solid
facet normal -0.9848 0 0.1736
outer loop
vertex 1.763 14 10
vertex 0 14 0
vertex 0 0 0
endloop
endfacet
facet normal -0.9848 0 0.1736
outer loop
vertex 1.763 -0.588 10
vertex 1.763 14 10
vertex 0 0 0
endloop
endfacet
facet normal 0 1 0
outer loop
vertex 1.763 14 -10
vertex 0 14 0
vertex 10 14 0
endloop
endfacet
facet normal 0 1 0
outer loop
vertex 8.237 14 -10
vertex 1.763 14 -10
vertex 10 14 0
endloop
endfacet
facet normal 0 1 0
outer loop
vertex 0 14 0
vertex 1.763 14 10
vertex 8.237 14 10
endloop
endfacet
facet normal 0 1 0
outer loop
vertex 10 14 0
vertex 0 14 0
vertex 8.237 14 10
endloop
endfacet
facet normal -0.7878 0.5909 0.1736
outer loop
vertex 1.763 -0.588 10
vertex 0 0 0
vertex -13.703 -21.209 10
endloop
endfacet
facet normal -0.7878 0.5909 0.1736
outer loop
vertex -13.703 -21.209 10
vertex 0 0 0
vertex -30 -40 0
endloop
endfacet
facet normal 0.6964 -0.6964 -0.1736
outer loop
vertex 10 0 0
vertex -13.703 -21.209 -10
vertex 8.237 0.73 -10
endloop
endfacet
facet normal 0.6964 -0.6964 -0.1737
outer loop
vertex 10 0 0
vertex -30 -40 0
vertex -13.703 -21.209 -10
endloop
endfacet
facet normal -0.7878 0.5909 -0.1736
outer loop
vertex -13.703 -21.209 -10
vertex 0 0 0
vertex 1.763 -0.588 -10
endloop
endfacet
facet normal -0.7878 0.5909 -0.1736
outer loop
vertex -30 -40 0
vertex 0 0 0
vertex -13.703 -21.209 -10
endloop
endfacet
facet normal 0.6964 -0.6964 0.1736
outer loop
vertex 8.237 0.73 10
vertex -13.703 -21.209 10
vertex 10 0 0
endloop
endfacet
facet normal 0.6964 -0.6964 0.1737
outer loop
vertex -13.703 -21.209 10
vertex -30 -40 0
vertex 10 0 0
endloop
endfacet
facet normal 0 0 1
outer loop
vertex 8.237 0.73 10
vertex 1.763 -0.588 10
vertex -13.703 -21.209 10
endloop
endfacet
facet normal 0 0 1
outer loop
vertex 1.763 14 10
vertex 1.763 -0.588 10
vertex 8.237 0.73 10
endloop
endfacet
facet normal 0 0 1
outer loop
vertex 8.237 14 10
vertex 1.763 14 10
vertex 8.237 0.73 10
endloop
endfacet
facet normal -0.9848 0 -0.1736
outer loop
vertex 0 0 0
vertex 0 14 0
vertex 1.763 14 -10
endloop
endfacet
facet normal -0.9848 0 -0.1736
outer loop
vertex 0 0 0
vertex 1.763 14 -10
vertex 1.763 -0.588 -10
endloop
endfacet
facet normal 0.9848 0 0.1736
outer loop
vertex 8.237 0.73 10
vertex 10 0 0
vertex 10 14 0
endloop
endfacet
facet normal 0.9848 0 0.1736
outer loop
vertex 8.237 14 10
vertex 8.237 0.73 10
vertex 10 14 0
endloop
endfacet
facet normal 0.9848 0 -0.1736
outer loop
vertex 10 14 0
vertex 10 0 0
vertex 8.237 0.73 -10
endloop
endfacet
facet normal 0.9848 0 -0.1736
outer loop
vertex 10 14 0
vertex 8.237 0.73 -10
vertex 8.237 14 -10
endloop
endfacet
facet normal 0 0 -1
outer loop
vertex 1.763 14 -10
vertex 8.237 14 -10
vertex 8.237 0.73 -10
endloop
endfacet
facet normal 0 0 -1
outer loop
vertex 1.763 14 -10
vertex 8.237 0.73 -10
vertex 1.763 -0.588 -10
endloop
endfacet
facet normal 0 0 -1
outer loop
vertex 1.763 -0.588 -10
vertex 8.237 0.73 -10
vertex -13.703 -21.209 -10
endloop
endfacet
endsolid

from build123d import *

# Parameters (mm, degrees)
EXTRUDE_1_DEPTH       = 10
EXTRUDE_1_DRAFT       = 10
MIRROR_1_COPY_1_DEPTH = 10
MIRROR_1_COPY_1_DRAFT = 10
SKETCH_4_W            = 44.504913076
SKETCH_4_H            = 42.19047619
CUT_EXTRUDE_4_DEPTH   = 50


with BuildPart() as part:
    # 草图2 → 凸台-拉伸1 (with draft: the straight prism first)
    with BuildSketch(Plane.XY):
        Polygon((0, 0), (-30, -40), (10, 0), (10, 20), (0, 20), align=None)
    extrude(amount=EXTRUDE_1_DEPTH)
    # 凸台-拉伸1: the draft: its side faces are tilted about the plane it starts from
    extrude_1_sides = [part.faces().sort_by_distance(p)[0] for p in [
        (-15, -20, 5),
        (-10, -20, 5),
        (10, 10, 5),
        (5, 20, 5),
        (0, 10, 5),
    ]]
    draft(extrude_1_sides, Plane.XY, EXTRUDE_1_DRAFT)


with BuildPart() as mirror_1_copy_1_tool:
    # 镜向1 copy 1 sketch → 镜向1 copy 1 (with draft: the straight prism first)
    with BuildSketch(Plane(origin=(0, 0, 0), x_dir=(1, 0, 0), z_dir=(0, 0, -1))):
        Polygon((0, 0), (-30, 40), (10, 0), (10, -20), (0, -20), align=None)
    extrude(amount=MIRROR_1_COPY_1_DEPTH)
    # 镜向1 copy 1: the draft: its side faces are tilted about the plane it starts from
    mirror_1_copy_1_sides = [mirror_1_copy_1_tool.faces().sort_by_distance(p)[0] for p in [
        (-15, -20, -5),
        (-10, -20, -5),
        (10, 10, -5),
        (5, 20, -5),
        (0, 10, -5),
    ]]
    draft(mirror_1_copy_1_sides, Plane(origin=(0, 0, 0), x_dir=(1, 0, 0), z_dir=(0, 0, -1)), MIRROR_1_COPY_1_DRAFT)


with BuildPart() as part_1:
    add(part.part)

    # 镜向1 copy 1: add mirror_1_copy_1_tool
    add(mirror_1_copy_1_tool.part)

    # 草图4 → 切除-拉伸4 (cut, symmetric)
    with BuildSketch(Plane.XY):
        with Locations((4.175676145, 35.095238095)):
            Rectangle(SKETCH_4_W, SKETCH_4_H)
    extrude(amount=CUT_EXTRUDE_4_DEPTH, both=True, mode=Mode.SUBTRACT)


solid = part_1.part
